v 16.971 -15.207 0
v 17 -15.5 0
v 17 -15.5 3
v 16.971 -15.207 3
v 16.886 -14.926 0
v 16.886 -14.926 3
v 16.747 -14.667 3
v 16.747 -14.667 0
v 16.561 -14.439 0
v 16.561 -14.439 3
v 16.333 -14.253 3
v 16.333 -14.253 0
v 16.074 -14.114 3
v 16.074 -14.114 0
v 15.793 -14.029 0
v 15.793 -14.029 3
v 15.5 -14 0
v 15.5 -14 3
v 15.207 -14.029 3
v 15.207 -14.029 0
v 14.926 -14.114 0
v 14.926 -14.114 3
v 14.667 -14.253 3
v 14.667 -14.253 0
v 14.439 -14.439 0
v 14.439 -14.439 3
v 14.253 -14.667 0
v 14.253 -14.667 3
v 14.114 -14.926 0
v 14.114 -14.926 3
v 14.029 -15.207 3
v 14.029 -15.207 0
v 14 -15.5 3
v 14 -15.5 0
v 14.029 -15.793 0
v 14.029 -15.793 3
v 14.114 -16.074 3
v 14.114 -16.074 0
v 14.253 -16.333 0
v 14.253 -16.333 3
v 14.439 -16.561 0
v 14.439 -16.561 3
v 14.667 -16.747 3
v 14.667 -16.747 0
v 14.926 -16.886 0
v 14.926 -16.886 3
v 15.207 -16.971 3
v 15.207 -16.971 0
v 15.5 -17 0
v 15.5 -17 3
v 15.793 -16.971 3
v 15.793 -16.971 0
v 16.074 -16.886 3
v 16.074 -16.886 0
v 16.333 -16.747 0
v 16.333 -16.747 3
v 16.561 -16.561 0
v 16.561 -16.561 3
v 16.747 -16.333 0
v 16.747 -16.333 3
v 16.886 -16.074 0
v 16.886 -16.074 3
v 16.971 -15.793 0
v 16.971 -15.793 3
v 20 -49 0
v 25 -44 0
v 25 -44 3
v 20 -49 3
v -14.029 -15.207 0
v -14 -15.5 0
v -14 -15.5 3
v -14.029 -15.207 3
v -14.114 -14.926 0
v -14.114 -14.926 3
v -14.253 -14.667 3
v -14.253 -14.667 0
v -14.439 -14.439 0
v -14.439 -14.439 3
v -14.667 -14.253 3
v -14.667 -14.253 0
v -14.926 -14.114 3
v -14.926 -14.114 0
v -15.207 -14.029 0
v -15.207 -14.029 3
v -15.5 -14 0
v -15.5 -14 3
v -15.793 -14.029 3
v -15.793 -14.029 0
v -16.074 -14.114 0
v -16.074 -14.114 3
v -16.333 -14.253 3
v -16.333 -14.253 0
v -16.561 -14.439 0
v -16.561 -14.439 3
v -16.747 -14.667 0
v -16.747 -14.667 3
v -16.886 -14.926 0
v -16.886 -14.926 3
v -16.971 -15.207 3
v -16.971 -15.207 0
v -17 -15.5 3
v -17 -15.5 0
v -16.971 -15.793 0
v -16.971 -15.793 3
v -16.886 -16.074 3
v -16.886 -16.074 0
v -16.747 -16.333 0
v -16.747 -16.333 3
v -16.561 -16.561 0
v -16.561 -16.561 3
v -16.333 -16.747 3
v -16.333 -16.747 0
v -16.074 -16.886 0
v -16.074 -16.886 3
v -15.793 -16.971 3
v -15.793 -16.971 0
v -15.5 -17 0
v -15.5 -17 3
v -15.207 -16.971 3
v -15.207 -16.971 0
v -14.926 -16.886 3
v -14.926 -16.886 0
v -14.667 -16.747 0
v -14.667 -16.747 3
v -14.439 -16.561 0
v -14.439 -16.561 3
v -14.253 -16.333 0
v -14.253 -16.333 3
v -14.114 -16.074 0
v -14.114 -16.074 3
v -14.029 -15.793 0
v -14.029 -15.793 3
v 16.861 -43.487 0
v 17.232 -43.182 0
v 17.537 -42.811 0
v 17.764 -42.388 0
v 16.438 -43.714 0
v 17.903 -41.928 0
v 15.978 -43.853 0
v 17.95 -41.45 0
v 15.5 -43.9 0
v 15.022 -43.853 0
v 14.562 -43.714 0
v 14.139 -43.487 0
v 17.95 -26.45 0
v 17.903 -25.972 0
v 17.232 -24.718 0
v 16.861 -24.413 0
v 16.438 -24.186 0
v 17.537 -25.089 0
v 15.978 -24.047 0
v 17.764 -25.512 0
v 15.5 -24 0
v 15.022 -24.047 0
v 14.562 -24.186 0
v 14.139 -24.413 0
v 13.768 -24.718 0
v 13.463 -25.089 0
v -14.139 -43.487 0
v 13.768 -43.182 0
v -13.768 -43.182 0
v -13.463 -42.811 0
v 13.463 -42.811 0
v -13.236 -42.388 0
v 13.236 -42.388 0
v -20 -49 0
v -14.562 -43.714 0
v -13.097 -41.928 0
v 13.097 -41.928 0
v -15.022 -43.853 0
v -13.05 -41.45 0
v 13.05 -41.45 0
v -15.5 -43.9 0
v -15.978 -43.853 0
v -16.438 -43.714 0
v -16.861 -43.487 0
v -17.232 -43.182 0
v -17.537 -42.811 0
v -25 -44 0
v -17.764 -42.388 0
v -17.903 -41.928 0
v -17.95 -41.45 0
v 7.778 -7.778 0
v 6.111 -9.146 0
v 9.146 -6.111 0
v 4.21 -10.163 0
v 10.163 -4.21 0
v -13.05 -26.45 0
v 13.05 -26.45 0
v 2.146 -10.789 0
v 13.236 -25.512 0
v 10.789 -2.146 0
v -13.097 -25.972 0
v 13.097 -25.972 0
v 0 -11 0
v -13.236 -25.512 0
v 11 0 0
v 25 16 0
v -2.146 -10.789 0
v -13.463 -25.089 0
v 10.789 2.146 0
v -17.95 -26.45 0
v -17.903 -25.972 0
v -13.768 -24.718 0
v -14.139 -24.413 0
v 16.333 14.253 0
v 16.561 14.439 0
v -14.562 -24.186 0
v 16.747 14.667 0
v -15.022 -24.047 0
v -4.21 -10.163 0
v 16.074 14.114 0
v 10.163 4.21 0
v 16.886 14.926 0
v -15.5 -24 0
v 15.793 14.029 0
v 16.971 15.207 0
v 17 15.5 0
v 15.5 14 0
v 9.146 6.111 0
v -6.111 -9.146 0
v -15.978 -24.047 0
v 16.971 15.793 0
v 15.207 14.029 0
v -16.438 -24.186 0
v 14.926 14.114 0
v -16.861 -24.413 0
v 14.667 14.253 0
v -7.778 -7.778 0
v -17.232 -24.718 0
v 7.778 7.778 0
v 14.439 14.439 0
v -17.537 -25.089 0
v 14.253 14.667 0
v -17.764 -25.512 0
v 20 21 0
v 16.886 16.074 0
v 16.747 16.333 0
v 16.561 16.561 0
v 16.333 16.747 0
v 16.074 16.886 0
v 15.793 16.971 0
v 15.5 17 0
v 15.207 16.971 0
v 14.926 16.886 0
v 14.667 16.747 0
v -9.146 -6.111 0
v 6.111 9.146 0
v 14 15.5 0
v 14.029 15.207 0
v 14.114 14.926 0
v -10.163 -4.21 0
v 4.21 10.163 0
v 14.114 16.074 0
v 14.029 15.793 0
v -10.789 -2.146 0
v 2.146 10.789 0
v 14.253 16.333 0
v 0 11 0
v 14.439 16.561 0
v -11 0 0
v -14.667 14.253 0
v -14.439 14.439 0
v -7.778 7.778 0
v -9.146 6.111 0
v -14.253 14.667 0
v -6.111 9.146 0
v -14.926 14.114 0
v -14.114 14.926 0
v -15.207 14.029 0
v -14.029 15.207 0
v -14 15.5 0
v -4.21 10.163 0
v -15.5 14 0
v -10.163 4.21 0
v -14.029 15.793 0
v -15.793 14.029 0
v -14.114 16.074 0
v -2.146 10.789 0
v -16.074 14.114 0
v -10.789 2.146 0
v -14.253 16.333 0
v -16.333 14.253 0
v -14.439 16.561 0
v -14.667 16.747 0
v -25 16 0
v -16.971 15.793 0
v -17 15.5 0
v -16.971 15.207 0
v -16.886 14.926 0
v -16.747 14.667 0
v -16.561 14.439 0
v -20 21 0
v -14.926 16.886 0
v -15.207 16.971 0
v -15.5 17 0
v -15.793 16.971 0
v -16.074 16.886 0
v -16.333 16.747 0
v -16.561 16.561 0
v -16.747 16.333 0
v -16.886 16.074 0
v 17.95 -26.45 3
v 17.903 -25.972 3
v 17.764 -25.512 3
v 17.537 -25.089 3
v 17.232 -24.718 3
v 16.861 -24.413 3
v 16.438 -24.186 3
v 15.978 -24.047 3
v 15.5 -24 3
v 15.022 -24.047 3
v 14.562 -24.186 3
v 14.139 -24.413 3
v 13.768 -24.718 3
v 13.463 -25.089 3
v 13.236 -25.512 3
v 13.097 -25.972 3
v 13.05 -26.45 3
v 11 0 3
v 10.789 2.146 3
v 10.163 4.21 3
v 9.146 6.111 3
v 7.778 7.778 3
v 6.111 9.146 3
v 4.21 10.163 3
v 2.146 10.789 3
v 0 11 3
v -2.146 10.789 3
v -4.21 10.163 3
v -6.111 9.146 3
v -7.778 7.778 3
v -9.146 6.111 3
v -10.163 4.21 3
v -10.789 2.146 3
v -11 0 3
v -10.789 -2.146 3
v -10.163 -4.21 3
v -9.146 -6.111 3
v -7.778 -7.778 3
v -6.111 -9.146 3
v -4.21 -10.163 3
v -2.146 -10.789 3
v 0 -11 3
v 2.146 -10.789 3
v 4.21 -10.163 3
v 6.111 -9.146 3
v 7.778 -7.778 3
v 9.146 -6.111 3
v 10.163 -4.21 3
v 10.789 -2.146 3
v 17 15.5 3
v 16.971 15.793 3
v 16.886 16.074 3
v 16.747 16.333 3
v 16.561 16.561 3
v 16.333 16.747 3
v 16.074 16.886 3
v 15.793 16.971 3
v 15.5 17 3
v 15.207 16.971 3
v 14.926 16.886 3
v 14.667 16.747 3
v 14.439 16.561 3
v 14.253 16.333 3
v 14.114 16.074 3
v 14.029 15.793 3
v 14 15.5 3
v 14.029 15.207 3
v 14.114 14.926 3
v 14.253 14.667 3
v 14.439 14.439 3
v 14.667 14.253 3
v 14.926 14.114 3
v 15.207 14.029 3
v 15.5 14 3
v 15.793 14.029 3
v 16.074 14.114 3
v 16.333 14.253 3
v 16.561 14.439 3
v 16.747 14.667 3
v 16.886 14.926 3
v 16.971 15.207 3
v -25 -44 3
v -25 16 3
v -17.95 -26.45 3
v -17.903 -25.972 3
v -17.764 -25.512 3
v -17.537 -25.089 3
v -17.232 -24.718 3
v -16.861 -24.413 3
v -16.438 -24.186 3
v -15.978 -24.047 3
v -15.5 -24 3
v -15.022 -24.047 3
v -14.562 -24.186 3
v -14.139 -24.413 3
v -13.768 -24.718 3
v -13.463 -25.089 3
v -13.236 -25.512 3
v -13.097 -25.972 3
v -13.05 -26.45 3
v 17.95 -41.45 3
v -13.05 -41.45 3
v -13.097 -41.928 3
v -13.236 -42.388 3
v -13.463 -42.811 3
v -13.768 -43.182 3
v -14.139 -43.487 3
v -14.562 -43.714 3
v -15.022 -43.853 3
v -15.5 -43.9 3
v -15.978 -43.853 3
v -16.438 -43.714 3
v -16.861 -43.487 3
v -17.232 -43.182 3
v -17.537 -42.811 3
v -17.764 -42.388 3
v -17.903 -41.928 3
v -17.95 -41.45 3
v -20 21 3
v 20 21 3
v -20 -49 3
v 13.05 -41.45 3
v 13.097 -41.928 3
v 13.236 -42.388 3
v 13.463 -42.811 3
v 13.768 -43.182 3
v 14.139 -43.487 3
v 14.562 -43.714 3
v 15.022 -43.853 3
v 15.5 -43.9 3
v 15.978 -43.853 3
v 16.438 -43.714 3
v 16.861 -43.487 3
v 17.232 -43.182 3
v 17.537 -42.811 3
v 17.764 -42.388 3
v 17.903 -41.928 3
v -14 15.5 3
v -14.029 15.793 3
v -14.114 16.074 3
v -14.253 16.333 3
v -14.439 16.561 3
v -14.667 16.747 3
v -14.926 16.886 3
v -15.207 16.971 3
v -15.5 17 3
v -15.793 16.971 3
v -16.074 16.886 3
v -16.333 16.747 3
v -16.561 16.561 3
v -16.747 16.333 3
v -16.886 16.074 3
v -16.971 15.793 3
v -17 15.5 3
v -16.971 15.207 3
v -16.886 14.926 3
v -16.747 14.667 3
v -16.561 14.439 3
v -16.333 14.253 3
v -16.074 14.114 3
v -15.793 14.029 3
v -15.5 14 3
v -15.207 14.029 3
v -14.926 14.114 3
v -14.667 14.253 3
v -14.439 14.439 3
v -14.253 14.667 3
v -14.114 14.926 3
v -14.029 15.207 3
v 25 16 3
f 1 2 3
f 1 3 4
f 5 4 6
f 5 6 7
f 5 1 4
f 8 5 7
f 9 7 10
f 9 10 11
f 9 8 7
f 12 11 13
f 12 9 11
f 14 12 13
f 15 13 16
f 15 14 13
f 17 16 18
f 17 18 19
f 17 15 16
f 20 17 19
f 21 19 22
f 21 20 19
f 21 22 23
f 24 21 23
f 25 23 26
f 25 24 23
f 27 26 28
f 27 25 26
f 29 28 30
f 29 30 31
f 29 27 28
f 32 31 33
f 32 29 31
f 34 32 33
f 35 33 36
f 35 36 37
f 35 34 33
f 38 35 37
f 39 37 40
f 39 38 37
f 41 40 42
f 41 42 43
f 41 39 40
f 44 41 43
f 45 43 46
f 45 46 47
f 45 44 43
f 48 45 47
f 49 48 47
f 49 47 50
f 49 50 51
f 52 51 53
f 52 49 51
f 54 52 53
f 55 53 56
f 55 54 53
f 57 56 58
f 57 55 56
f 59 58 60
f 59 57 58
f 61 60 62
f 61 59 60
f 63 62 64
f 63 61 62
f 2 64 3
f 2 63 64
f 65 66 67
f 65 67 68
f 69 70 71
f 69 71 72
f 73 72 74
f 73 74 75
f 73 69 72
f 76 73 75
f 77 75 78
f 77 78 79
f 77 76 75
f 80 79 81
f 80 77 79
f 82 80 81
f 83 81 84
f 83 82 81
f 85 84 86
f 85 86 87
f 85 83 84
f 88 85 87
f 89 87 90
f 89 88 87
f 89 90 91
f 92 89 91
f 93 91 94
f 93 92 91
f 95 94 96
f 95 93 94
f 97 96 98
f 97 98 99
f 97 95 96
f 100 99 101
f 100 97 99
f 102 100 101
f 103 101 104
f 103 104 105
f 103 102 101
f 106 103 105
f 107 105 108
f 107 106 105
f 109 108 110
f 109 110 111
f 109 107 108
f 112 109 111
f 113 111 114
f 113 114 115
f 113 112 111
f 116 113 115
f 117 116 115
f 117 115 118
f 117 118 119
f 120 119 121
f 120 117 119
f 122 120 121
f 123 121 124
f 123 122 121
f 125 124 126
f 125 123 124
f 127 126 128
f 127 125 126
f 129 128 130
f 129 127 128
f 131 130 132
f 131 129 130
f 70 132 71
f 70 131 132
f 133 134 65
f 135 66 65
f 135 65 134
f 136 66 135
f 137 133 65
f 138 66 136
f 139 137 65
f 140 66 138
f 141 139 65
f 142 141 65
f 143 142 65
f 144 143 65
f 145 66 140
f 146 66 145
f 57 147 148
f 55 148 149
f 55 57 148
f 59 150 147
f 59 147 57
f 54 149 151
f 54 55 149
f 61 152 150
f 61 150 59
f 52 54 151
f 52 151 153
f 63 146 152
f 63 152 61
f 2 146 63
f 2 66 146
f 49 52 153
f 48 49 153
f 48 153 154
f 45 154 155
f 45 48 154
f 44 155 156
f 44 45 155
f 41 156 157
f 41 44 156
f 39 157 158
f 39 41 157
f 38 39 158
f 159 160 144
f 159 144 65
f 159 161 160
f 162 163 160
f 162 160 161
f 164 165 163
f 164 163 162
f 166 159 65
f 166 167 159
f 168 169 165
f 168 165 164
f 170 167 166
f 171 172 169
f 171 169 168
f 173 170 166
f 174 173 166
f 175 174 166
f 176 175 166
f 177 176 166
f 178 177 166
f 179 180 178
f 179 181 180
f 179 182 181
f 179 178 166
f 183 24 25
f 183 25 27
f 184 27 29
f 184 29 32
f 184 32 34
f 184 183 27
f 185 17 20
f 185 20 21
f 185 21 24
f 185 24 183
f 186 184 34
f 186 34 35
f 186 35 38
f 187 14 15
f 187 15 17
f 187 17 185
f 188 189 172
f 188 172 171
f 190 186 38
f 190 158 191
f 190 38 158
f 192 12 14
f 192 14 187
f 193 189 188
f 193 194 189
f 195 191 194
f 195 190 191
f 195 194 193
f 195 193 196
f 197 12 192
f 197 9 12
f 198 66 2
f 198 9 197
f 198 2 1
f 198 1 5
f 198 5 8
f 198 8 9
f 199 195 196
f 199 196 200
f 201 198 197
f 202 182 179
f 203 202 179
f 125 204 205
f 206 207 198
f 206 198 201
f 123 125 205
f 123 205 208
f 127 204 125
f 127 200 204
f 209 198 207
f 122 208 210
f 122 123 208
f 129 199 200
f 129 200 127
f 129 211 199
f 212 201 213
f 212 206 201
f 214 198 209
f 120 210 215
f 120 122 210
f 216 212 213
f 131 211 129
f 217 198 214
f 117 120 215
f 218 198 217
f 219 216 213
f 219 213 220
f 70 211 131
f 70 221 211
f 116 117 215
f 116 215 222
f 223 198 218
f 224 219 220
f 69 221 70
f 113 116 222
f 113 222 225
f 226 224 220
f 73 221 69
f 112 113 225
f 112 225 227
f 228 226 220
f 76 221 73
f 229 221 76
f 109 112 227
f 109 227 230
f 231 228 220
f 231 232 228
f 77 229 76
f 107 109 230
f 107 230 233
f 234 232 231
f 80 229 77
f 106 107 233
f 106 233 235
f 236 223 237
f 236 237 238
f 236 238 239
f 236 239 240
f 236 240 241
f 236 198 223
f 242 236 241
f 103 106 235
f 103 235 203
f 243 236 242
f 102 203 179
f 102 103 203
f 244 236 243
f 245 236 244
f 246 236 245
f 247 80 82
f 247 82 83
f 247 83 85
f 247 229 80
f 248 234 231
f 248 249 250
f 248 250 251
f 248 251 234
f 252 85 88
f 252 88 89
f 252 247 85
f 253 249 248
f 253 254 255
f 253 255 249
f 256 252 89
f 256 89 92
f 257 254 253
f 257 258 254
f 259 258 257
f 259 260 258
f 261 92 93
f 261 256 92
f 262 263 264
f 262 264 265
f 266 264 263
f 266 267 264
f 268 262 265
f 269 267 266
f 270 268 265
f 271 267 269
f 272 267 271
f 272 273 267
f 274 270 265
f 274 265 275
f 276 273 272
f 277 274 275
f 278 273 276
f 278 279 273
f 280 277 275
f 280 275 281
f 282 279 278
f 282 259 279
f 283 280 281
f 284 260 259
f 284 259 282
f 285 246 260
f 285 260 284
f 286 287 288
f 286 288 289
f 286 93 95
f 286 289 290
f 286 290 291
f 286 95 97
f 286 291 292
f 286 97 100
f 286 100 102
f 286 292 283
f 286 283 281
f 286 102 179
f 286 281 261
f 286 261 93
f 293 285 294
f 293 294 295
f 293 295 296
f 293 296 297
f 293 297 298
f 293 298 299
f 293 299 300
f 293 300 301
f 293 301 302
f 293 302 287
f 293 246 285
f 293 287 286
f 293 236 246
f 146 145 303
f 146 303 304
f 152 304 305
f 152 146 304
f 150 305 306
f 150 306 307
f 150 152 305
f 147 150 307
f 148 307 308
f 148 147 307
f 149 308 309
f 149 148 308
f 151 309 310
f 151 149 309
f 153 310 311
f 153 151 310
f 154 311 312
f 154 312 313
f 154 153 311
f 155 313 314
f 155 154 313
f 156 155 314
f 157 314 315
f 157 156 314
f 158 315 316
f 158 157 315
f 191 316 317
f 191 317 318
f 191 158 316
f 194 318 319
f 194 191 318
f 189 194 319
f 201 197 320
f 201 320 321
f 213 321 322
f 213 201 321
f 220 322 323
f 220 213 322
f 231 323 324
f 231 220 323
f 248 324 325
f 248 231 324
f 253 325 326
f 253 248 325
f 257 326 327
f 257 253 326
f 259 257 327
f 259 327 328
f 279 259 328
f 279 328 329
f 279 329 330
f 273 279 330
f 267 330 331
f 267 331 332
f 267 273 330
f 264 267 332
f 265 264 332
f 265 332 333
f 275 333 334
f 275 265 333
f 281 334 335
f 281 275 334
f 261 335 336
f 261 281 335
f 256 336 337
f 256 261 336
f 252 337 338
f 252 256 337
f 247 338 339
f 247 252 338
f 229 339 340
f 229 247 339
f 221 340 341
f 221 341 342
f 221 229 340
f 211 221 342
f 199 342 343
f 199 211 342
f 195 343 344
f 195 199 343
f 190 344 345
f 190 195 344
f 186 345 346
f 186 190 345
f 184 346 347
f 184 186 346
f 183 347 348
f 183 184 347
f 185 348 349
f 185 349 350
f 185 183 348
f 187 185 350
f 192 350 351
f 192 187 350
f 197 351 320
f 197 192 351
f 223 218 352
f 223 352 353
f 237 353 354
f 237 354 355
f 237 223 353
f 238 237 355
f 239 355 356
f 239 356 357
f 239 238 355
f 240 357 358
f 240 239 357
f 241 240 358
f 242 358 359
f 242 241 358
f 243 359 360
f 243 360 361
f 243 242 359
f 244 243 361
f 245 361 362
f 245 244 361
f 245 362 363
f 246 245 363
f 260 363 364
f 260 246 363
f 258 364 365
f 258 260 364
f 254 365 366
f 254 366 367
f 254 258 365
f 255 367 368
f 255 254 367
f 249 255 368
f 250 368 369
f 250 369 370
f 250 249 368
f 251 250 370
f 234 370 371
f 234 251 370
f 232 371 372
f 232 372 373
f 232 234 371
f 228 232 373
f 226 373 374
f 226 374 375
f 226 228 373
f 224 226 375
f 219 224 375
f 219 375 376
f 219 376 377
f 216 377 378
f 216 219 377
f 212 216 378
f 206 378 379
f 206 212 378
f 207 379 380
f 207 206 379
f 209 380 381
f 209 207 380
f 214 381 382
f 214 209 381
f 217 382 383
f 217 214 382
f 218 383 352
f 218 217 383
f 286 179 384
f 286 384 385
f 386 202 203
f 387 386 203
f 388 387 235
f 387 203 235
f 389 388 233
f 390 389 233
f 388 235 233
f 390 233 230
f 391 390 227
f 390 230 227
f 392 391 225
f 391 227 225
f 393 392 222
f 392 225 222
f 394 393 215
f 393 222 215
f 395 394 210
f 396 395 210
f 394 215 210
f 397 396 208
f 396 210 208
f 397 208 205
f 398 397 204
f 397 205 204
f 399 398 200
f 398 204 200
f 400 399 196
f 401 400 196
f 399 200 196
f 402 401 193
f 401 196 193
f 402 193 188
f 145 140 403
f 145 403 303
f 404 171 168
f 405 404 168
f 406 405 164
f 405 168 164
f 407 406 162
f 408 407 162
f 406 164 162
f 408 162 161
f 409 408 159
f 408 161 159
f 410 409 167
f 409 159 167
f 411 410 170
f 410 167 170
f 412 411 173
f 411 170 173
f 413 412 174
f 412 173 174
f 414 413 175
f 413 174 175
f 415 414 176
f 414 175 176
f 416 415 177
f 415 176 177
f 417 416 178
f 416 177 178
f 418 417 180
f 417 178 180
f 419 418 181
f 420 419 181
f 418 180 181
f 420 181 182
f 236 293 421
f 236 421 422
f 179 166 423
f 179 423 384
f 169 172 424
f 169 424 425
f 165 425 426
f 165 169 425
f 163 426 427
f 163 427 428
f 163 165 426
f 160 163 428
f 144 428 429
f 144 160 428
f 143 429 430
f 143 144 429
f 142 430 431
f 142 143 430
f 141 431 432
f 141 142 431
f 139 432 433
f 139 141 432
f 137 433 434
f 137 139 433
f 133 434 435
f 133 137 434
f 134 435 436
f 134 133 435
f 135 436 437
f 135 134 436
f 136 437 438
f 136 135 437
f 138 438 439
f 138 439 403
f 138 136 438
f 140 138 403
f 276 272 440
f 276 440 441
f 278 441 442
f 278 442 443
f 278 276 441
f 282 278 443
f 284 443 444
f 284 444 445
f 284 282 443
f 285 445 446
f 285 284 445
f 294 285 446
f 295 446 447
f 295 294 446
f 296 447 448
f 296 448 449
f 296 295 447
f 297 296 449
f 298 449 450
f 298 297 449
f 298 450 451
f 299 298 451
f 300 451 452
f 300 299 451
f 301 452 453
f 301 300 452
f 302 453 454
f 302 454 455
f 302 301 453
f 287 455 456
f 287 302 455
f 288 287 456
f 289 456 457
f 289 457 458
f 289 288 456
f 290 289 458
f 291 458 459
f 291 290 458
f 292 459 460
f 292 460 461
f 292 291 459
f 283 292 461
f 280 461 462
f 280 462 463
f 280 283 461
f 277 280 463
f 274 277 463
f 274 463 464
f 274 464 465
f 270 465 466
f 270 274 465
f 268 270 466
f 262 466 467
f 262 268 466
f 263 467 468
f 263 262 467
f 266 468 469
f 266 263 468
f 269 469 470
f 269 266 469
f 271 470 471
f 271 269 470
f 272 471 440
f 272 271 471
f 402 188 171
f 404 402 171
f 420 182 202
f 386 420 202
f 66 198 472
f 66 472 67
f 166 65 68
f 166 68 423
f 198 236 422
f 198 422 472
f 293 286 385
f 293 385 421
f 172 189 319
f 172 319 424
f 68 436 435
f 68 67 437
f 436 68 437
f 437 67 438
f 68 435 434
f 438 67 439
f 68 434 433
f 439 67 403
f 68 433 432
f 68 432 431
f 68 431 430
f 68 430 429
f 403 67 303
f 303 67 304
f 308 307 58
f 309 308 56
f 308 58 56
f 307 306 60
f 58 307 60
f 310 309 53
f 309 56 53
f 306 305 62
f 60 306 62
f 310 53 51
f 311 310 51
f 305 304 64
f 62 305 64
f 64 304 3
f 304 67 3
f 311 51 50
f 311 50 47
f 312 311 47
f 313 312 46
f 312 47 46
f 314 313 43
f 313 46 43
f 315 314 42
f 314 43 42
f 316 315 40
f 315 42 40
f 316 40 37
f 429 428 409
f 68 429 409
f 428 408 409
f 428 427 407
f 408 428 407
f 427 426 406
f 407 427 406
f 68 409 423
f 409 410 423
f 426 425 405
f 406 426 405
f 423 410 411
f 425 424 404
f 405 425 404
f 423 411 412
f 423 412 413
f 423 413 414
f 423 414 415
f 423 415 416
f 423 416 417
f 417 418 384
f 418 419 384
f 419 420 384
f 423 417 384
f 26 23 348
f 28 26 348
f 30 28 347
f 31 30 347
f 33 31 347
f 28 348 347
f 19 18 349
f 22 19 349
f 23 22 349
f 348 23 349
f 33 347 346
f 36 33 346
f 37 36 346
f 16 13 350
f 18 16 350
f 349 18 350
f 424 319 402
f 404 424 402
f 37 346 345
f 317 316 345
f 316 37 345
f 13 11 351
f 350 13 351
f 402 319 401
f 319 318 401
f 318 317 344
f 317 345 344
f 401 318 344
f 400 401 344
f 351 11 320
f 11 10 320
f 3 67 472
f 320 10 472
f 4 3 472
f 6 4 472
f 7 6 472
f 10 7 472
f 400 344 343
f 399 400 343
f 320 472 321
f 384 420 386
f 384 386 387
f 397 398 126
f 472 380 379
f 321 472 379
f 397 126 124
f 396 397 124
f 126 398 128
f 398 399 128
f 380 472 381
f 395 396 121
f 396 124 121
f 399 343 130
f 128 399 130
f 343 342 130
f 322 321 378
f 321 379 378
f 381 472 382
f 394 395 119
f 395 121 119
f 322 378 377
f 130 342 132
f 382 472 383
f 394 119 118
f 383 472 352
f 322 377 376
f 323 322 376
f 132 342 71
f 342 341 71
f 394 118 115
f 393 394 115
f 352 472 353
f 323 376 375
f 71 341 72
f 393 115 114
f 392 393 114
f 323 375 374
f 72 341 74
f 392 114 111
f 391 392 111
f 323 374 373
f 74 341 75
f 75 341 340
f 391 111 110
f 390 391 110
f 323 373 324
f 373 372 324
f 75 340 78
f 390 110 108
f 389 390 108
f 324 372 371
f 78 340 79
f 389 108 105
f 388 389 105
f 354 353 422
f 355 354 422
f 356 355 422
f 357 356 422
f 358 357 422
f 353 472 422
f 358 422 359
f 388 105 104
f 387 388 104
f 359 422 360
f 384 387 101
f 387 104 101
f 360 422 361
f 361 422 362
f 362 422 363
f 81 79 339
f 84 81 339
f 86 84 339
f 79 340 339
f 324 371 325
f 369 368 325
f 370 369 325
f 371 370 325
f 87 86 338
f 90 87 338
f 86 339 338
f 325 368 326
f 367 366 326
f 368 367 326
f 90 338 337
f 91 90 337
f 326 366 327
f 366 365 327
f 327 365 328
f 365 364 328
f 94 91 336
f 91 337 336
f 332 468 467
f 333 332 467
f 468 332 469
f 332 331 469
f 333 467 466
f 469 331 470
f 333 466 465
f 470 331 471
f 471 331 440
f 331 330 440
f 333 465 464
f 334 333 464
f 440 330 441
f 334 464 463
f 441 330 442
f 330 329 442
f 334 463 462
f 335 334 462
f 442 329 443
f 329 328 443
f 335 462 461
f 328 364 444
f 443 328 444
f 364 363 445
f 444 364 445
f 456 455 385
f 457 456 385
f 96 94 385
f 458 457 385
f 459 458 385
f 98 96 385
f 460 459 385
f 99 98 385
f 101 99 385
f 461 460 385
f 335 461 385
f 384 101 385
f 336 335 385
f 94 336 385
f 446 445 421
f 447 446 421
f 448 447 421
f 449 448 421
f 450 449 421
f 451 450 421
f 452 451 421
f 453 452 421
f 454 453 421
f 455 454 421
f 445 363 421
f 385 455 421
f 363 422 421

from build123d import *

# Parameters (mm, degrees)
SKETCH1_R           = 11
SKETCH1_R_2         = 1.5
BOSS_EXTRUDE1_DEPTH = 3


with BuildPart() as part:
    # Sketch1 → Boss-Extrude1 (new body)
    with BuildSketch(Plane.XY):
        Polygon((20, -49), (-20, -49), (-25, -44), (-25, 16), (-20, 21), (20, 21), (25, 16), (25, -44), align=None)
        Circle(SKETCH1_R, mode=Mode.SUBTRACT)
        with Locations((-15.5, 15.5)):
            Circle(SKETCH1_R_2, mode=Mode.SUBTRACT)
        with Locations((15.5, 15.5)):
            Circle(SKETCH1_R_2, mode=Mode.SUBTRACT)
        with Locations((-15.5, -15.5)):
            Circle(SKETCH1_R_2, mode=Mode.SUBTRACT)
        with Locations((15.5, -15.5)):
            Circle(SKETCH1_R_2, mode=Mode.SUBTRACT)
        with BuildLine():
            Line((-13.05, -26.45), (-13.05, -41.45))
            ThreePointArc((-13.05, -41.45), (-15.5, -43.9), (-17.95, -41.45))
            Line((-17.95, -41.45), (-17.95, -26.45))
            ThreePointArc((-17.95, -26.45), (-15.5, -24), (-13.05, -26.45))
        make_face(mode=Mode.SUBTRACT)
        with BuildLine():
            Line((13.05, -26.45), (13.05, -41.45))
            ThreePointArc((13.05, -41.45), (15.5, -43.9), (17.95, -41.45))
            Line((17.95, -41.45), (17.95, -26.45))
            ThreePointArc((17.95, -26.45), (15.5, -24), (13.05, -26.45))
        make_face(mode=Mode.SUBTRACT)
    extrude(amount=BOSS_EXTRUDE1_DEPTH)


solid = part.part
